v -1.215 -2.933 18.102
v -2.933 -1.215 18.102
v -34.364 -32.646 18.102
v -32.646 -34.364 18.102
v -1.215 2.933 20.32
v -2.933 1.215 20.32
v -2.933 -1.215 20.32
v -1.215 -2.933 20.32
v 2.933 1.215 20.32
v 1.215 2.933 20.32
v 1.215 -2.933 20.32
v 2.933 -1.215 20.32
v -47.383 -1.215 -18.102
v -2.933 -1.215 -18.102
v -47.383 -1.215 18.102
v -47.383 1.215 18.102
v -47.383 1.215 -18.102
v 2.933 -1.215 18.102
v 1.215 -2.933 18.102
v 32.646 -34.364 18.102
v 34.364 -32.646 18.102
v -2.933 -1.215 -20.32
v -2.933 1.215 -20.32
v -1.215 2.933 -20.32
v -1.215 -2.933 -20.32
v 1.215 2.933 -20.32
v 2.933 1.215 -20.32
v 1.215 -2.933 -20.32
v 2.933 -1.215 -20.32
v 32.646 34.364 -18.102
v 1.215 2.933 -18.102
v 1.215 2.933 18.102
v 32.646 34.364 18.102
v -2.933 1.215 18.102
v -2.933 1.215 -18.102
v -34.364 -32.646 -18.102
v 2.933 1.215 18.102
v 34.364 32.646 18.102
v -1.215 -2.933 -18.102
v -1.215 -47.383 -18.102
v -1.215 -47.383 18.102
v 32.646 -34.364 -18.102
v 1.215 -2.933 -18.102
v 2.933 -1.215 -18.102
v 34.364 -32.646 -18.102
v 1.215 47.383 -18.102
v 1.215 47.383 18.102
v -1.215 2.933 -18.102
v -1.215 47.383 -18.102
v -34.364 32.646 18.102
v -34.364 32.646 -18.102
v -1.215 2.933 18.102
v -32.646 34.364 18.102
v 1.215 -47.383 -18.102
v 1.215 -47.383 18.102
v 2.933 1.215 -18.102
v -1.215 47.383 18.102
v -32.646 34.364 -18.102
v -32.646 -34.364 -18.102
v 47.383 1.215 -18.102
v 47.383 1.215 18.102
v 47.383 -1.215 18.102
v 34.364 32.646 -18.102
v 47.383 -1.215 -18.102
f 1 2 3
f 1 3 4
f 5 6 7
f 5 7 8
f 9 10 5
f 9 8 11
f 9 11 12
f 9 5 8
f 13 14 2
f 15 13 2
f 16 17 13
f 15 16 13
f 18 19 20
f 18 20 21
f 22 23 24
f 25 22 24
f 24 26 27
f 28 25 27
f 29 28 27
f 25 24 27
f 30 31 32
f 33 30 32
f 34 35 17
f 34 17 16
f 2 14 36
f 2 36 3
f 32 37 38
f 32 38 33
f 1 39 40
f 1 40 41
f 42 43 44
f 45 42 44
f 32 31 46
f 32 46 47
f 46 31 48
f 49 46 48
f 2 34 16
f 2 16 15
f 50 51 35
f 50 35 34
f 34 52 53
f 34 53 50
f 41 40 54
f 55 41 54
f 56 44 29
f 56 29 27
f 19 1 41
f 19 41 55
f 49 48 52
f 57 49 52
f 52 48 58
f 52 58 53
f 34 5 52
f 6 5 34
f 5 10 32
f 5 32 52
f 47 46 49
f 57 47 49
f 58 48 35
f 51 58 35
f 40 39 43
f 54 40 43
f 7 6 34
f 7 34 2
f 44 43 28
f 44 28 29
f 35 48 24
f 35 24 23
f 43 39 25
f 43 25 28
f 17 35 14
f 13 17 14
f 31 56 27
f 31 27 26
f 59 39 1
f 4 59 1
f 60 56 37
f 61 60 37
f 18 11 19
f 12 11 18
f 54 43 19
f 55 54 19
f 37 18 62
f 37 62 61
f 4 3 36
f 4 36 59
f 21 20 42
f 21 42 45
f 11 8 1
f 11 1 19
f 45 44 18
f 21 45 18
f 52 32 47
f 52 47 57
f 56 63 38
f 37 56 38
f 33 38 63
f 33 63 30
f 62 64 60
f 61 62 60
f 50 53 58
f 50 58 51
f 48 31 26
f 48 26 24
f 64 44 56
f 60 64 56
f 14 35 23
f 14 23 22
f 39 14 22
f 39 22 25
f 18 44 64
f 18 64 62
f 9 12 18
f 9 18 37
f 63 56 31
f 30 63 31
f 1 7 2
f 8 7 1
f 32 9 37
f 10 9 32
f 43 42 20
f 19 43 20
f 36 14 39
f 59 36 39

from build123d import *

# Parameters (mm, degrees)
F1_DEPTH      = 20.32
F1_DEPTH_BACK = 20.32
F2_W          = 2.4300397955
F2_H          = 36.2040139735
F10_DEPTH     = 44.45
F3_W          = 2.4300397955
F3_H          = 36.2040139735
F11_DEPTH     = 44.45
F4_W          = 2.4300397955
F4_H          = 36.2040139735
F12_DEPTH     = 44.45
F5_W          = 2.4300397955
F5_H          = 36.2040139735
F13_DEPTH     = 44.45
F6_W          = 2.4300397955
F6_H          = 36.2040139735
F14_DEPTH     = 44.45
F9_W          = 2.4300397955
F9_H          = 36.2040139735
F15_DEPTH     = 44.45
F8_W          = 2.4300397955
F8_H          = 36.2040139735
F16_DEPTH     = 44.45
F7_W          = 2.4300397955
F7_H          = 36.2040139735
F17_DEPTH     = 44.45


with BuildPart() as f1:
    # F0 (on Top) → F1 (new body, two sides)
    with BuildSketch(Plane.XY) as f1_sk:
        Polygon((1.2150198978, 2.9333175157), (-1.2150198978, 2.9333175157), (-2.9333175157, 1.2150198978), (-2.9333175157, -1.2150198978), (-1.2150198978, -2.9333175157), (1.2150198978, -2.9333175157), (2.9333175157, -1.2150198978), (2.9333175157, 1.2150198978), align=None)
    extrude(amount=F1_DEPTH)
    extrude(f1_sk.sketch, amount=-F1_DEPTH_BACK)

    # F2 (on face) → F10 (join)
    with BuildSketch(Plane(origin=(0, 2.9333175157, 0), x_dir=(-1, 0, 0), z_dir=(0, 1, 0))):
        Rectangle(F2_W, F2_H)
    extrude(amount=F10_DEPTH)

    # F3 (on face) → F11 (join)
    with BuildSketch(Plane(origin=(2.0741687067, 2.0741687067, 0), x_dir=(-0.7071067812, 0.7071067812, 0), z_dir=(0.7071067812, 0.7071067812, 0))):
        Rectangle(F3_W, F3_H)
    extrude(amount=F11_DEPTH)

    # F4 (on face) → F12 (join)
    with BuildSketch(Plane.YZ.offset(2.9333175157)):
        Rectangle(F4_W, F4_H)
    extrude(amount=F12_DEPTH)

    # F5 (on face) → F13 (join)
    with BuildSketch(Plane(origin=(2.0741687067, -2.0741687067, 0), x_dir=(0.7071067812, 0.7071067812, 0), z_dir=(0.7071067812, -0.7071067812, 0))):
        Rectangle(F5_W, F5_H)
    extrude(amount=F13_DEPTH)

    # F6 (on face) → F14 (join)
    with BuildSketch(Plane.XZ.offset(2.9333175157)):
        Rectangle(F6_W, F6_H)
    extrude(amount=F14_DEPTH)

    # F9 (on face) → F15 (join)
    with BuildSketch(Plane(origin=(-2.0741687067, 2.0741687067, 0), x_dir=(-0.7071067812, -0.7071067812, 0), z_dir=(-0.7071067812, 0.7071067812, 0))):
        Rectangle(F9_W, F9_H)
    extrude(amount=F15_DEPTH)

    # F8 (on face) → F16 (join)
    with BuildSketch(Plane(origin=(-2.9333175157, 0, 0), x_dir=(0, -1, 0), z_dir=(-1, 0, 0))):
        Rectangle(F8_W, F8_H)
    extrude(amount=F16_DEPTH)

    # F7 (on face) → F17 (join)
    with BuildSketch(Plane(origin=(-2.0741687067, -2.0741687067, 0), x_dir=(0.7071067812, -0.7071067812, 0), z_dir=(-0.7071067812, -0.7071067812, 0))):
        Rectangle(F7_W, F7_H)
    extrude(amount=F17_DEPTH)


solid = f1.part
